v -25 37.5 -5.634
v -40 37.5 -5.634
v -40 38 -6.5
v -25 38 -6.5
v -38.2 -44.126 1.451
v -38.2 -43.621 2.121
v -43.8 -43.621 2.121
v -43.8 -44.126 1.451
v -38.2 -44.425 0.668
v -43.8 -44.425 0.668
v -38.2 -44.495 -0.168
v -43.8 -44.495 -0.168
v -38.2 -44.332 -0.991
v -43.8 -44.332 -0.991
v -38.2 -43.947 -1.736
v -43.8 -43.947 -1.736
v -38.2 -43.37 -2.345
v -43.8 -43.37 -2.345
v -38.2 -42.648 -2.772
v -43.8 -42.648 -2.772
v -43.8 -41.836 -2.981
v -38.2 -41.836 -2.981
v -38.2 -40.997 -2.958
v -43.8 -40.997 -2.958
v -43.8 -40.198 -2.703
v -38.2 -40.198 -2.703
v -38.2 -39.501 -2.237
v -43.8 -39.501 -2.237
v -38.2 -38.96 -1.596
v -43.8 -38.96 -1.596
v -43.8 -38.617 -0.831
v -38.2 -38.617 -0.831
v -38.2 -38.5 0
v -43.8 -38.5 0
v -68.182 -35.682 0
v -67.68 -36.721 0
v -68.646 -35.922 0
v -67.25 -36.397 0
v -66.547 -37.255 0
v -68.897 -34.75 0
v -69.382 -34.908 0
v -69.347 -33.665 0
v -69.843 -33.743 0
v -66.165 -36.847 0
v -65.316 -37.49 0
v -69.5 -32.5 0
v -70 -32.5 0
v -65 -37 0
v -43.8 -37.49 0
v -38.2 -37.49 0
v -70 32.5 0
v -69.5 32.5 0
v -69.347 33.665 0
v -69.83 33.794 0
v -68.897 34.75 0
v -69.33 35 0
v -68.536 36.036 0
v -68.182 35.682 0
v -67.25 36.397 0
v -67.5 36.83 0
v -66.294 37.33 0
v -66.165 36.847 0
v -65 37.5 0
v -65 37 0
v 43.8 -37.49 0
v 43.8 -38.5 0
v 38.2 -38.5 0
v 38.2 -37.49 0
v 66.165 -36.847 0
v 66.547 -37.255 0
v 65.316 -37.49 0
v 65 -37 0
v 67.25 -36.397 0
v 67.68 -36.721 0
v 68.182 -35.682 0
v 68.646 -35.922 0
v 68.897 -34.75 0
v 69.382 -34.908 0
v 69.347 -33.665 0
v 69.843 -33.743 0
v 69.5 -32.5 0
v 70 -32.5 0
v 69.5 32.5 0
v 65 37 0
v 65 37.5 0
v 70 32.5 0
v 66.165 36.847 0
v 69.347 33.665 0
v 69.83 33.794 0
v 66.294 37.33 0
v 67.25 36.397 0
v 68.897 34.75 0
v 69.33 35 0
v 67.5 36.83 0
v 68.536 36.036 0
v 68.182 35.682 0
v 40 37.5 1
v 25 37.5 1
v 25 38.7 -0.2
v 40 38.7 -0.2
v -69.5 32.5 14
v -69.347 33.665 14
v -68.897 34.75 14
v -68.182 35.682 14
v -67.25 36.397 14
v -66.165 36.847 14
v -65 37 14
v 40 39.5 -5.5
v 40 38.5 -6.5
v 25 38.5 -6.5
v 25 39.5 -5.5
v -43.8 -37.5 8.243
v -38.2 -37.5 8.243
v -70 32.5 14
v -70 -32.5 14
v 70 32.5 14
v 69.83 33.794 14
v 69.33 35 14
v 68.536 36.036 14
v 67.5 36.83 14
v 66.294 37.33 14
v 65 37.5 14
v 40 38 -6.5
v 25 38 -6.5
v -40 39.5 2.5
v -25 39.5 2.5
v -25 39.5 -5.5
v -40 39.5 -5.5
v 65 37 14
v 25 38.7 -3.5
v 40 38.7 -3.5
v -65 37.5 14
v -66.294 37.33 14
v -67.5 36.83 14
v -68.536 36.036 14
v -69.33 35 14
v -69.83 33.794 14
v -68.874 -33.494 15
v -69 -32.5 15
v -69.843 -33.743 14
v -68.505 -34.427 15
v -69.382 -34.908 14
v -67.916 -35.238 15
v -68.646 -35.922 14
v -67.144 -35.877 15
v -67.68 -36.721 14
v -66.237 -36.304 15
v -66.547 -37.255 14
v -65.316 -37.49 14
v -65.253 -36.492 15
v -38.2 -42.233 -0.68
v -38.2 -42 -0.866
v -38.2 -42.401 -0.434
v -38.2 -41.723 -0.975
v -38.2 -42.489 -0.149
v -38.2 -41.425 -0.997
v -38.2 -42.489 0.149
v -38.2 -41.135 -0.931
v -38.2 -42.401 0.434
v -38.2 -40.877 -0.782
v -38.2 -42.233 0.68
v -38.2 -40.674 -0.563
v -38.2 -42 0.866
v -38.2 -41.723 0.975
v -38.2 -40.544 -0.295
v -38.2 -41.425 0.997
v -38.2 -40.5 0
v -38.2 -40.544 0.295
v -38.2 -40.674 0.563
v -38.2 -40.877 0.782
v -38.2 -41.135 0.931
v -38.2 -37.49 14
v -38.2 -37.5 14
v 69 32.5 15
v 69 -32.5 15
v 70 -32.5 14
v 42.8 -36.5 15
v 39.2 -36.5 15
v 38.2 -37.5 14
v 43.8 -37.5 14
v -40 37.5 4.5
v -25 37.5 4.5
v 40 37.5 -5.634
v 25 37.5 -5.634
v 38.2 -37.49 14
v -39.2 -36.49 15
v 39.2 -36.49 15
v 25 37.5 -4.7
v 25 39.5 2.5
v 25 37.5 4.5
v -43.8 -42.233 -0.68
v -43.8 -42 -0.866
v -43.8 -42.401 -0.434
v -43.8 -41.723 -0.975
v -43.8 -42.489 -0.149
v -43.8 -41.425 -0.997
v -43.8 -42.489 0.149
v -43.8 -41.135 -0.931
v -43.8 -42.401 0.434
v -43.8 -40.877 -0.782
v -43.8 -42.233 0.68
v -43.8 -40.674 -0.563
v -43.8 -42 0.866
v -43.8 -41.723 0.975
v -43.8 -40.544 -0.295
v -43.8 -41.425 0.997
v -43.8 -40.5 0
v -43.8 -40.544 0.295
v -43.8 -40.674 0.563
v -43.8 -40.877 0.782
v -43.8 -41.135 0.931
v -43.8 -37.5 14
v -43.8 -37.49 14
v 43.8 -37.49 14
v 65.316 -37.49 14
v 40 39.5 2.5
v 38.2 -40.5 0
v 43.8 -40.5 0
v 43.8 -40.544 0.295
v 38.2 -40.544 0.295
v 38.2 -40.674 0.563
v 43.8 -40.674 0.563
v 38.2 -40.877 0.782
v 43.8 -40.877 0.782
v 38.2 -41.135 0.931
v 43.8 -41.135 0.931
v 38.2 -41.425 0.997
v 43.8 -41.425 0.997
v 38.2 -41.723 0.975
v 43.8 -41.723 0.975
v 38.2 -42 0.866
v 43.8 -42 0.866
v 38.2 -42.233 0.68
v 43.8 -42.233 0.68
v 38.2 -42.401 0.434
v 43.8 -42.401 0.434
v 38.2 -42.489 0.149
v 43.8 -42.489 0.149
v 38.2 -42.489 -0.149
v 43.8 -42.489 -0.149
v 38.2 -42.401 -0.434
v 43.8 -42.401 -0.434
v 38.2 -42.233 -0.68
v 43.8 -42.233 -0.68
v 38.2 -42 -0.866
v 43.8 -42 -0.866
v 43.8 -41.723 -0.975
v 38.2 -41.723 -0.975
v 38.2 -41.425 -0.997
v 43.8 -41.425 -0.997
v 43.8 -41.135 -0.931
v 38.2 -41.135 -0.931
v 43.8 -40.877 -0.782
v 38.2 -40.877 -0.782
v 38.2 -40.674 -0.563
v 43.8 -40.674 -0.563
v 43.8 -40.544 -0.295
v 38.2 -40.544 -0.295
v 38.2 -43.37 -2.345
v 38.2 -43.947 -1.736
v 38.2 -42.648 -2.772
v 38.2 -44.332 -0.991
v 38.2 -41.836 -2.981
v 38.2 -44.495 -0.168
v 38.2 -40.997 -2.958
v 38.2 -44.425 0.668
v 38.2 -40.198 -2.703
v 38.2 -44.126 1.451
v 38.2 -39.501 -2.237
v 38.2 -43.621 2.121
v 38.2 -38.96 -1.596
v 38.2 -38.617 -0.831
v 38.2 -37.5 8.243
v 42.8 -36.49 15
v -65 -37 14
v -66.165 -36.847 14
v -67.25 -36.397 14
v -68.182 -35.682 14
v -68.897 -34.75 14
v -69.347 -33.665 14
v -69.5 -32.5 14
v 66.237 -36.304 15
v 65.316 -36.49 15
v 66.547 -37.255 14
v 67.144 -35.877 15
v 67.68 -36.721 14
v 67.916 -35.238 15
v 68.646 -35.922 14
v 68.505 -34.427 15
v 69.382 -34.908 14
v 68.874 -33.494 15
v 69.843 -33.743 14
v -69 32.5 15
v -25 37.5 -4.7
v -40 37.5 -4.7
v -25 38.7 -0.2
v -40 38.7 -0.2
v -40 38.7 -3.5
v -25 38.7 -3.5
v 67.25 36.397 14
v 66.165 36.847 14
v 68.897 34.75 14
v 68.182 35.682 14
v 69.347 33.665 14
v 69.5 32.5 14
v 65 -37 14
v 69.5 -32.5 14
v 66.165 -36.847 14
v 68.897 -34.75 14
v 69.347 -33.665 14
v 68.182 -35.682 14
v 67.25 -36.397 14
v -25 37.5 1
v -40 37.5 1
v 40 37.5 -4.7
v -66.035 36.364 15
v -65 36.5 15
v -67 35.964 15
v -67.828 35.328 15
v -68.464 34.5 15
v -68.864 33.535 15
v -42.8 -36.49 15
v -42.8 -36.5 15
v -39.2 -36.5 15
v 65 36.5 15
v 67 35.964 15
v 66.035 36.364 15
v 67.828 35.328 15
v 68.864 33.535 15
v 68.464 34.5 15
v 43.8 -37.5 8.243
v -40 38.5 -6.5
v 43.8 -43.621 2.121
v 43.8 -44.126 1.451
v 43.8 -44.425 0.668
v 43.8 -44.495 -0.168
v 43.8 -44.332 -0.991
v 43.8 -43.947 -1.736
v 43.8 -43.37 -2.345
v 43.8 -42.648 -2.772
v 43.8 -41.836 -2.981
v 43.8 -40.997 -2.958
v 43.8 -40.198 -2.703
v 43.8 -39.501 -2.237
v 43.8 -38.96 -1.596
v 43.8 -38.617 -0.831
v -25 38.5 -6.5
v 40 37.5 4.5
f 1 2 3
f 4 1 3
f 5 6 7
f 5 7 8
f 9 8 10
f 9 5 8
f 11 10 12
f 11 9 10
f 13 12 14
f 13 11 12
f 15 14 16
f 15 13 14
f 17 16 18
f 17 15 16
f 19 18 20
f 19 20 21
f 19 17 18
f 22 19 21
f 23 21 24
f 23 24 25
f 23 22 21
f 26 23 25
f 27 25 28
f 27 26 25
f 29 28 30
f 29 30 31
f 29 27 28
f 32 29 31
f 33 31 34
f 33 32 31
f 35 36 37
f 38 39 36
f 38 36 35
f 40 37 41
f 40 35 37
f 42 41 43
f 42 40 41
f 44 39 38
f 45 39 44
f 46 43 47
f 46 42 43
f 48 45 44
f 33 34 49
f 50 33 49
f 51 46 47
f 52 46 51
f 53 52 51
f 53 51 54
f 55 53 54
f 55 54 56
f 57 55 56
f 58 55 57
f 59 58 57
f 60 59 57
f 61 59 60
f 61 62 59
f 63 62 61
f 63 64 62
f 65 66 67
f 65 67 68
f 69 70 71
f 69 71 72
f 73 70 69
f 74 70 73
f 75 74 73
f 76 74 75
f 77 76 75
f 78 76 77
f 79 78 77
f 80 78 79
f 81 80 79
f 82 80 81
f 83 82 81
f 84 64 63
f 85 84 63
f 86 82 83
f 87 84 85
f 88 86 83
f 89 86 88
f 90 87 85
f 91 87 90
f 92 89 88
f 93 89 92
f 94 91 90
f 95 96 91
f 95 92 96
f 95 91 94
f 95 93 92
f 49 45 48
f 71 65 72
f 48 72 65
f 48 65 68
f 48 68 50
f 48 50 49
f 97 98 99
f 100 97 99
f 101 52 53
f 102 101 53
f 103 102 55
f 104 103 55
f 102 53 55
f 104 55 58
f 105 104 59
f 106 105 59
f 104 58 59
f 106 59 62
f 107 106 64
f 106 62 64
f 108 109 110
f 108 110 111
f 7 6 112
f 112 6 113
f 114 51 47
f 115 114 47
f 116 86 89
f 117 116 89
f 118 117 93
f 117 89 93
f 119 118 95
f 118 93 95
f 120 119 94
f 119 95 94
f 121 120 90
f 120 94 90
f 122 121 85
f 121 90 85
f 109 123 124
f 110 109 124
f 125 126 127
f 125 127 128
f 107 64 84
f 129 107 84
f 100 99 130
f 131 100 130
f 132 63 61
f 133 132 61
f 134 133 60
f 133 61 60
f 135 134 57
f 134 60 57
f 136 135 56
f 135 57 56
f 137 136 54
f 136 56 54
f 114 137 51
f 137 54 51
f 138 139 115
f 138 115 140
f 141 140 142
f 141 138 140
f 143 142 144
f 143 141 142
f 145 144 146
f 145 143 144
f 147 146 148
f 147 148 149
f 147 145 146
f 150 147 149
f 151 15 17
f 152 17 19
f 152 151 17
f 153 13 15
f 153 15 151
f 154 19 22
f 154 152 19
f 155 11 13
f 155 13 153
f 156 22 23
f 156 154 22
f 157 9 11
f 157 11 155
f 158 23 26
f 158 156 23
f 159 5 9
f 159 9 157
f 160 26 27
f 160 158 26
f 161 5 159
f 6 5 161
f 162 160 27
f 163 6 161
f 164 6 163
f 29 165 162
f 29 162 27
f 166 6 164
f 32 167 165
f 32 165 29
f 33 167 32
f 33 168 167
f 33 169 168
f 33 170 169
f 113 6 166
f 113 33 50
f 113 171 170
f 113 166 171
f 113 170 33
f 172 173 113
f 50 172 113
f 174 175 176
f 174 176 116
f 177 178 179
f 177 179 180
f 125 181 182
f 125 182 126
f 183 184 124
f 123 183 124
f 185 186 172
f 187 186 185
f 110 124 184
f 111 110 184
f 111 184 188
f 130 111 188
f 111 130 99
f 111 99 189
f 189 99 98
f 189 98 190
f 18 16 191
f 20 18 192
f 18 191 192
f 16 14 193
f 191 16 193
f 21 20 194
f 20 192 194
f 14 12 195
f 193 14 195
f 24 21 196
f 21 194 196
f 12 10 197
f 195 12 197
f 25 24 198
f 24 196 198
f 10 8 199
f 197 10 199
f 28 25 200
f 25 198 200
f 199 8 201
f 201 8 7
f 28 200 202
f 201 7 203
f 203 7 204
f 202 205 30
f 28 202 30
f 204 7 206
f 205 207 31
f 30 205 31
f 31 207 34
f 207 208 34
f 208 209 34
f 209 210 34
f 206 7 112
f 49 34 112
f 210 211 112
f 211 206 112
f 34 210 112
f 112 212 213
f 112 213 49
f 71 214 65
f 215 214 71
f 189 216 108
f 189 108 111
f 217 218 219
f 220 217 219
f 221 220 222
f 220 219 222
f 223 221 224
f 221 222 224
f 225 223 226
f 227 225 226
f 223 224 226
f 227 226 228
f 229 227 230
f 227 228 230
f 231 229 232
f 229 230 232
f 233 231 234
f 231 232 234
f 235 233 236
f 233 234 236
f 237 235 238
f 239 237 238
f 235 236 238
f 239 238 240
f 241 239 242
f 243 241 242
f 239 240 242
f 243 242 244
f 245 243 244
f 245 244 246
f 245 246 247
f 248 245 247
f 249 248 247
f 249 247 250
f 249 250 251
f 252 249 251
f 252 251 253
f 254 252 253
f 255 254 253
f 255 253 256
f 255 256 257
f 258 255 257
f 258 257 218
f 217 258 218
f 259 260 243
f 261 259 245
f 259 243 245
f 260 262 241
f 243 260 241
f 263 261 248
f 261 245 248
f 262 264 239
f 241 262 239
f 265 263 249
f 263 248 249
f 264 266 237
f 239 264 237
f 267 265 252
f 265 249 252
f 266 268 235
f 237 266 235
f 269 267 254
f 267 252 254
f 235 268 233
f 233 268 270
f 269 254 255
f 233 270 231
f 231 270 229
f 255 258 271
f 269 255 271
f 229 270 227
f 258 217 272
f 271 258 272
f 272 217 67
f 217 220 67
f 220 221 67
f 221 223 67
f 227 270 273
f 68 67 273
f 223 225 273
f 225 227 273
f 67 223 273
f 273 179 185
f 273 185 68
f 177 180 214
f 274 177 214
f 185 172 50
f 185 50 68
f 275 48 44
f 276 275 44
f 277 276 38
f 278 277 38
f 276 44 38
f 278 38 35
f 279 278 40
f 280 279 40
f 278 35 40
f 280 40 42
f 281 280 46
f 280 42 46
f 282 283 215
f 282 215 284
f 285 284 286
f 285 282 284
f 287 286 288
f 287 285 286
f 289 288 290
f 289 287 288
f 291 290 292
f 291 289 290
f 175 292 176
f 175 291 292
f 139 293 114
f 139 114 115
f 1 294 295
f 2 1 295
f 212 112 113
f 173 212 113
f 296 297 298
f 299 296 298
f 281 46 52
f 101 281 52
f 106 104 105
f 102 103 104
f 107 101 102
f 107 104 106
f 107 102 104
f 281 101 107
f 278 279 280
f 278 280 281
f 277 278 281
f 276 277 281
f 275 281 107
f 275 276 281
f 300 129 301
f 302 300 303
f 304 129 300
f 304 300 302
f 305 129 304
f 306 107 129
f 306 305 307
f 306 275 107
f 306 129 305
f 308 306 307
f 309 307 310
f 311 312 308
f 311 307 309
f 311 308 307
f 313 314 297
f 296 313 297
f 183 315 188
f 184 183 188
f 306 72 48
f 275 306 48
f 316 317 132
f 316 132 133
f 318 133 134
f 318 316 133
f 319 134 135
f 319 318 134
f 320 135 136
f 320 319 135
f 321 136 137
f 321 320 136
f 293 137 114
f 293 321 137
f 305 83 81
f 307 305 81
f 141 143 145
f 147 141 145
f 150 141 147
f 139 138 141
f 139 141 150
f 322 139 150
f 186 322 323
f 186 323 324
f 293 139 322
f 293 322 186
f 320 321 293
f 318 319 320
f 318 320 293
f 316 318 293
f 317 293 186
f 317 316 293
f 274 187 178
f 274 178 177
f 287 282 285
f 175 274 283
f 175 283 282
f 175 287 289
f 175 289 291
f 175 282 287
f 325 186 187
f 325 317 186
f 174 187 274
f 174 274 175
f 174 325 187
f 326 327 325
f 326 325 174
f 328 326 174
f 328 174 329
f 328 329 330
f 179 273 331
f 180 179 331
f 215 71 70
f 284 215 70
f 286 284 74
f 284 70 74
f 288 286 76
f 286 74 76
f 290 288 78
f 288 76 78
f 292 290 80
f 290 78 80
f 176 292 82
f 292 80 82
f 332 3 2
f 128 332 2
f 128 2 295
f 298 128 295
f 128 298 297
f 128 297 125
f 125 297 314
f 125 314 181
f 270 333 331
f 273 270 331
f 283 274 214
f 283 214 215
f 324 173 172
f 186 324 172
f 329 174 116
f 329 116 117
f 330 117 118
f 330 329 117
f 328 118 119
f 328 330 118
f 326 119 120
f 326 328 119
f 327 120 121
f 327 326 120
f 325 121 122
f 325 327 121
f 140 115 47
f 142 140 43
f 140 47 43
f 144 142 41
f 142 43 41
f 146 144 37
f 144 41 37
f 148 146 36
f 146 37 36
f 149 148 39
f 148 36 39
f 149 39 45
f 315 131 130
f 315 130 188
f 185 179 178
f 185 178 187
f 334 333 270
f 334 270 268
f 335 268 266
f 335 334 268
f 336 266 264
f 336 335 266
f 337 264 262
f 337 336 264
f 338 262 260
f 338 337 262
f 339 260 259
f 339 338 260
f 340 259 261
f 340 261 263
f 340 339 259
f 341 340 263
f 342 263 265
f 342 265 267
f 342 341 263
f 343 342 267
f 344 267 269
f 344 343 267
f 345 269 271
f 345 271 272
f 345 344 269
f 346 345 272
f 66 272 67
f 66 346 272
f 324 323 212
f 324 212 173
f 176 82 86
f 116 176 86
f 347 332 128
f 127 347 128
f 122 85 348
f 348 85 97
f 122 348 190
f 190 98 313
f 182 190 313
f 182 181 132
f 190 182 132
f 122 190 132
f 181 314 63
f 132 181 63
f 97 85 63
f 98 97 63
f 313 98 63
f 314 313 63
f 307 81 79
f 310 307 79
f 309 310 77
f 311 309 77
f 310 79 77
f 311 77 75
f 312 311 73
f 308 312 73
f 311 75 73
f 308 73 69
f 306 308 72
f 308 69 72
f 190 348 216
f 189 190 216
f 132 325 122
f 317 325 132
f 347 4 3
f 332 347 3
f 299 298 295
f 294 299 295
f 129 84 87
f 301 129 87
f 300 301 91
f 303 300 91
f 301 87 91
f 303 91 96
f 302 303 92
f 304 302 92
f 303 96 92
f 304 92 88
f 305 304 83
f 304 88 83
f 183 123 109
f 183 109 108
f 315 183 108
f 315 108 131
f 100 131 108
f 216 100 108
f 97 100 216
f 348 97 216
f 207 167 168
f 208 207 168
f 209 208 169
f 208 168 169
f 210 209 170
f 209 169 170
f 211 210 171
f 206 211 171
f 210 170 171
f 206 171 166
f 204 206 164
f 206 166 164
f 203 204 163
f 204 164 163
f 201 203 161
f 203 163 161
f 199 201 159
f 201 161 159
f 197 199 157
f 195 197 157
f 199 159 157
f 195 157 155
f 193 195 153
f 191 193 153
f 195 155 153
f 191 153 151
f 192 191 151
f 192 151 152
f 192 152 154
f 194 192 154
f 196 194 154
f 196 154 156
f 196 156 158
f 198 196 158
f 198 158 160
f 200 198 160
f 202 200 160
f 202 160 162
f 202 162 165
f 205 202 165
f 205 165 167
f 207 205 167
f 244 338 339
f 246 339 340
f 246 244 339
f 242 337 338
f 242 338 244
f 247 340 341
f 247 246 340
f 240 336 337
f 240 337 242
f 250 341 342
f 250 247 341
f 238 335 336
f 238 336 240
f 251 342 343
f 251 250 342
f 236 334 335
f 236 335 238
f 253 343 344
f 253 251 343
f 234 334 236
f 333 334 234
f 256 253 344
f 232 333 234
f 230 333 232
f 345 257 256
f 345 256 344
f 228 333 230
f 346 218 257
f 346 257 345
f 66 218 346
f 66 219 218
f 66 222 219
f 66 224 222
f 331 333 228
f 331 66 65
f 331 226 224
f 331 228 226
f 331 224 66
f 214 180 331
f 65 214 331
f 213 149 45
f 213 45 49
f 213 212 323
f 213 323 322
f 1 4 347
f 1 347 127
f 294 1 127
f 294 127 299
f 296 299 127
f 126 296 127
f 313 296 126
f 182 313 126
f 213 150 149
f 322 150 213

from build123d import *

# Parameters (mm, degrees)
PAD002_DEPTH         = 15
POCKET002_DEPTH      = 14
SKETCH006_R          = 1
PAD003_DEPTH         = 140
SKETCH007_W          = 26.2
SKETCH007_H          = 10
SKETCH007_W_2        = 76.4
POCKET003_DEPTH      = 18.001
SKETCH011_W          = 15
SKETCH011_H          = 11
PAD005_DEPTH         = 2
POCKET006_DEPTH      = 140.001
POCKET006_DEPTH_BACK = 0.001
CHAMFER_SIZE         = 1


with BuildPart() as part:
    # Sketch004 → Pad002 (new body)
    with BuildSketch(Plane.XY):
        with BuildLine():
            Line((-70, 32.5), (-70, -32.5))
            ThreePointArc((-70, -32.5), (-68.535534, -36.035534), (-65, -37.5))
            Line((-65, -37.5), (65, -37.5))
            ThreePointArc((65, -37.5), (68.535534, -36.035534), (70, -32.5))
            Line((70, -32.5), (70, 32.5))
            ThreePointArc((70, 32.5), (68.535534, 36.035534), (65, 37.5))
            Line((65, 37.5), (-65, 37.5))
            ThreePointArc((-65, 37.5), (-68.535534, 36.035534), (-70, 32.5))
        make_face()
    extrude(amount=PAD002_DEPTH)

    # Sketch005 (on Face9 of Pad002) → Pocket002 (cut)
    with BuildSketch(Plane(origin=(0, 0, 0), x_dir=(1, 0, 0), z_dir=(0, 0, -1))):
        with BuildLine():
            Line((-69.5, 32.5), (-69.5, -32.5))
            ThreePointArc((-69.5, -32.5), (-68.181981, -35.681981), (-65, -37))
            Line((-65, -37), (65, -37))
            ThreePointArc((65, -37), (68.181981, -35.681981), (69.5, -32.5))
            Line((69.5, -32.5), (69.5, 32.5))
            ThreePointArc((69.5, 32.5), (68.181981, 35.681981), (65, 37))
            Line((65, 37), (-65, 37))
            ThreePointArc((-65, 37), (-68.181981, 35.681981), (-69.5, 32.5))
        make_face()
    extrude(amount=-POCKET002_DEPTH, mode=Mode.SUBTRACT)

    # Sketch006 (on Face10 of Pocket002) → Pad003 (join)
    with BuildSketch(Plane.YZ.offset(70)):
        with BuildLine():
            ThreePointArc((-43.62132, 2.12132), (-42.64805, -2.771639), (-38.5, 0))
            Line((-38.5, 0), (-37.5, 0))
            Line((-37.5, 0), (-37.5, 8.242641))
            Line((-43.62132, 2.12132), (-37.5, 8.242641))
        make_face()
        with Locations((-41.5, 0)):
            Circle(SKETCH006_R, mode=Mode.SUBTRACT)
    extrude(amount=-PAD003_DEPTH)

    # Sketch007 (on Face4 of Pad003) → Pocket003 (cut, through all)
    with BuildSketch(Plane.XY.offset(15)):
        with Locations((56.9, -42.49)):
            Rectangle(SKETCH007_W, SKETCH007_H)
        with Locations((0, -42.49)):
            Rectangle(SKETCH007_W_2, SKETCH007_H)
        with Locations((-56.9, -42.49)):
            Rectangle(SKETCH007_W, SKETCH007_H)
    extrude(amount=-POCKET003_DEPTH, mode=Mode.SUBTRACT)

    # Sketch011 (on Face6 of Pocket003) → Pad005 (join)
    with BuildSketch(Plane(origin=(0, 37.5, 0), x_dir=(-1, 0, 0), z_dir=(0, 1, 0))):
        with Locations((32.5, -1)):
            Rectangle(SKETCH011_W, SKETCH011_H)
        with Locations((-32.5, -1)):
            Rectangle(SKETCH011_W, SKETCH011_H)
    extrude(amount=PAD005_DEPTH)

    # Sketch012 (on Face1 of Pad005) → Pocket006 (cut, two sides)
    with BuildSketch(Plane(origin=(-70, 0, 0), x_dir=(0, -1, 0), z_dir=(-1, 0, 0))) as pocket006_sk:
        Polygon((-38.5, -6.5), (-39.5, -5.5), (-39.5, -6.5), align=None)
        Polygon((-37.5, 4.5), (-39.5, 2.5), (-39.5, 4.5), align=None)
        Polygon((-37.5, 1), (-38.7, -0.2), (-38.7, -3.5), (-37.5, -4.7), align=None)
        Polygon((-37.5, -5.633975), (-38, -6.5), (-37.5, -6.5), align=None)
    extrude(amount=-POCKET006_DEPTH, mode=Mode.SUBTRACT)
    extrude(pocket006_sk.sketch, amount=POCKET006_DEPTH_BACK, mode=Mode.SUBTRACT)

    # Chamfer
    chamfer_edges = [part.edges().sort_by_distance(p)[0] for p in [
        (-68.535534, 36.035534, 15),
        (0, 37.5, 15),
        (68.535534, 36.035534, 15),
        (70, 0, 15),
        (68.645569, -35.921962, 15),
        (54.558035, -37.49, 15),
        (43.8, -37.495, 15),
        (41, -37.5, 15),
        (38.2, -37.495, 15),
        (0, -37.49, 15),
        (-38.2, -37.495, 15),
        (-41, -37.5, 15),
        (-43.8, -37.495, 15),
        (-54.558035, -37.49, 15),
        (-68.645569, -35.921962, 15),
        (-70, 0, 15),
    ]]
    chamfer(chamfer_edges, length=CHAMFER_SIZE)


solid = part.part
